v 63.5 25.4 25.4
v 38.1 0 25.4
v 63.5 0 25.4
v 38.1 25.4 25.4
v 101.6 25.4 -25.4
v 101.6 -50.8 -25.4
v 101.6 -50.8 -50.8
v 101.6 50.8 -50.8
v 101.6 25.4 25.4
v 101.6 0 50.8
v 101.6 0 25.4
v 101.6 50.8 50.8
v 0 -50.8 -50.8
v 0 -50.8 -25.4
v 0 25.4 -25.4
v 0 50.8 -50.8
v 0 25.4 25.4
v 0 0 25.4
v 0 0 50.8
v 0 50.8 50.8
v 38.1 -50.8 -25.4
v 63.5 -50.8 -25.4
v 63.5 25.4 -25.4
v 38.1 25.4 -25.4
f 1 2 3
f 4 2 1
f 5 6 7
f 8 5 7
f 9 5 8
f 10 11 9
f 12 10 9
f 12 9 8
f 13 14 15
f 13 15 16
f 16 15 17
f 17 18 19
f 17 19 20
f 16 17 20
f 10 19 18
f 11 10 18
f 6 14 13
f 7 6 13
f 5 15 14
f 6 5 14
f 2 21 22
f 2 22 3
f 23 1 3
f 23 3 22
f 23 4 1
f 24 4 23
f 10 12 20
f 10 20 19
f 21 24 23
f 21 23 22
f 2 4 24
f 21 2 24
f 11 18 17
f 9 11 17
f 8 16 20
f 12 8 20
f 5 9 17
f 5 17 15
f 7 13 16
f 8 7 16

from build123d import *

# Parameters (mm, degrees)
F1_DEPTH = 101.6
F3_DEPTH = 25.4


with BuildPart() as f1:
    # F0 (on Right) → F1 (new body)
    with BuildSketch(Plane.YZ):
        Polygon((25.4, -25.4), (0, -25.4), (-50.8, -25.4), (-50.8, -50.8), (50.8, -50.8), (50.8, 50.8), (0, 50.8), (0, 25.4), (25.4, 25.4), align=None)
    extrude(amount=F1_DEPTH)


with BuildPart() as f3:
    # F2 (on face) → F3 (new body)
    with BuildSketch(Plane(origin=(0, 0, 0), x_dir=(0, -1, 0), z_dir=(-1, 0, 0))):
        Polygon((0, 25.4), (-25.4, 25.4), (-25.4, -25.4), (50.8, -25.4), align=None)
    extrude(amount=-F3_DEPTH)


with BuildPart() as f3_1:
    # F4: moved
    add(f3.part.moved(Location((38.1, 0, 0))))


solid = Compound([f1.part, f3_1.part])
